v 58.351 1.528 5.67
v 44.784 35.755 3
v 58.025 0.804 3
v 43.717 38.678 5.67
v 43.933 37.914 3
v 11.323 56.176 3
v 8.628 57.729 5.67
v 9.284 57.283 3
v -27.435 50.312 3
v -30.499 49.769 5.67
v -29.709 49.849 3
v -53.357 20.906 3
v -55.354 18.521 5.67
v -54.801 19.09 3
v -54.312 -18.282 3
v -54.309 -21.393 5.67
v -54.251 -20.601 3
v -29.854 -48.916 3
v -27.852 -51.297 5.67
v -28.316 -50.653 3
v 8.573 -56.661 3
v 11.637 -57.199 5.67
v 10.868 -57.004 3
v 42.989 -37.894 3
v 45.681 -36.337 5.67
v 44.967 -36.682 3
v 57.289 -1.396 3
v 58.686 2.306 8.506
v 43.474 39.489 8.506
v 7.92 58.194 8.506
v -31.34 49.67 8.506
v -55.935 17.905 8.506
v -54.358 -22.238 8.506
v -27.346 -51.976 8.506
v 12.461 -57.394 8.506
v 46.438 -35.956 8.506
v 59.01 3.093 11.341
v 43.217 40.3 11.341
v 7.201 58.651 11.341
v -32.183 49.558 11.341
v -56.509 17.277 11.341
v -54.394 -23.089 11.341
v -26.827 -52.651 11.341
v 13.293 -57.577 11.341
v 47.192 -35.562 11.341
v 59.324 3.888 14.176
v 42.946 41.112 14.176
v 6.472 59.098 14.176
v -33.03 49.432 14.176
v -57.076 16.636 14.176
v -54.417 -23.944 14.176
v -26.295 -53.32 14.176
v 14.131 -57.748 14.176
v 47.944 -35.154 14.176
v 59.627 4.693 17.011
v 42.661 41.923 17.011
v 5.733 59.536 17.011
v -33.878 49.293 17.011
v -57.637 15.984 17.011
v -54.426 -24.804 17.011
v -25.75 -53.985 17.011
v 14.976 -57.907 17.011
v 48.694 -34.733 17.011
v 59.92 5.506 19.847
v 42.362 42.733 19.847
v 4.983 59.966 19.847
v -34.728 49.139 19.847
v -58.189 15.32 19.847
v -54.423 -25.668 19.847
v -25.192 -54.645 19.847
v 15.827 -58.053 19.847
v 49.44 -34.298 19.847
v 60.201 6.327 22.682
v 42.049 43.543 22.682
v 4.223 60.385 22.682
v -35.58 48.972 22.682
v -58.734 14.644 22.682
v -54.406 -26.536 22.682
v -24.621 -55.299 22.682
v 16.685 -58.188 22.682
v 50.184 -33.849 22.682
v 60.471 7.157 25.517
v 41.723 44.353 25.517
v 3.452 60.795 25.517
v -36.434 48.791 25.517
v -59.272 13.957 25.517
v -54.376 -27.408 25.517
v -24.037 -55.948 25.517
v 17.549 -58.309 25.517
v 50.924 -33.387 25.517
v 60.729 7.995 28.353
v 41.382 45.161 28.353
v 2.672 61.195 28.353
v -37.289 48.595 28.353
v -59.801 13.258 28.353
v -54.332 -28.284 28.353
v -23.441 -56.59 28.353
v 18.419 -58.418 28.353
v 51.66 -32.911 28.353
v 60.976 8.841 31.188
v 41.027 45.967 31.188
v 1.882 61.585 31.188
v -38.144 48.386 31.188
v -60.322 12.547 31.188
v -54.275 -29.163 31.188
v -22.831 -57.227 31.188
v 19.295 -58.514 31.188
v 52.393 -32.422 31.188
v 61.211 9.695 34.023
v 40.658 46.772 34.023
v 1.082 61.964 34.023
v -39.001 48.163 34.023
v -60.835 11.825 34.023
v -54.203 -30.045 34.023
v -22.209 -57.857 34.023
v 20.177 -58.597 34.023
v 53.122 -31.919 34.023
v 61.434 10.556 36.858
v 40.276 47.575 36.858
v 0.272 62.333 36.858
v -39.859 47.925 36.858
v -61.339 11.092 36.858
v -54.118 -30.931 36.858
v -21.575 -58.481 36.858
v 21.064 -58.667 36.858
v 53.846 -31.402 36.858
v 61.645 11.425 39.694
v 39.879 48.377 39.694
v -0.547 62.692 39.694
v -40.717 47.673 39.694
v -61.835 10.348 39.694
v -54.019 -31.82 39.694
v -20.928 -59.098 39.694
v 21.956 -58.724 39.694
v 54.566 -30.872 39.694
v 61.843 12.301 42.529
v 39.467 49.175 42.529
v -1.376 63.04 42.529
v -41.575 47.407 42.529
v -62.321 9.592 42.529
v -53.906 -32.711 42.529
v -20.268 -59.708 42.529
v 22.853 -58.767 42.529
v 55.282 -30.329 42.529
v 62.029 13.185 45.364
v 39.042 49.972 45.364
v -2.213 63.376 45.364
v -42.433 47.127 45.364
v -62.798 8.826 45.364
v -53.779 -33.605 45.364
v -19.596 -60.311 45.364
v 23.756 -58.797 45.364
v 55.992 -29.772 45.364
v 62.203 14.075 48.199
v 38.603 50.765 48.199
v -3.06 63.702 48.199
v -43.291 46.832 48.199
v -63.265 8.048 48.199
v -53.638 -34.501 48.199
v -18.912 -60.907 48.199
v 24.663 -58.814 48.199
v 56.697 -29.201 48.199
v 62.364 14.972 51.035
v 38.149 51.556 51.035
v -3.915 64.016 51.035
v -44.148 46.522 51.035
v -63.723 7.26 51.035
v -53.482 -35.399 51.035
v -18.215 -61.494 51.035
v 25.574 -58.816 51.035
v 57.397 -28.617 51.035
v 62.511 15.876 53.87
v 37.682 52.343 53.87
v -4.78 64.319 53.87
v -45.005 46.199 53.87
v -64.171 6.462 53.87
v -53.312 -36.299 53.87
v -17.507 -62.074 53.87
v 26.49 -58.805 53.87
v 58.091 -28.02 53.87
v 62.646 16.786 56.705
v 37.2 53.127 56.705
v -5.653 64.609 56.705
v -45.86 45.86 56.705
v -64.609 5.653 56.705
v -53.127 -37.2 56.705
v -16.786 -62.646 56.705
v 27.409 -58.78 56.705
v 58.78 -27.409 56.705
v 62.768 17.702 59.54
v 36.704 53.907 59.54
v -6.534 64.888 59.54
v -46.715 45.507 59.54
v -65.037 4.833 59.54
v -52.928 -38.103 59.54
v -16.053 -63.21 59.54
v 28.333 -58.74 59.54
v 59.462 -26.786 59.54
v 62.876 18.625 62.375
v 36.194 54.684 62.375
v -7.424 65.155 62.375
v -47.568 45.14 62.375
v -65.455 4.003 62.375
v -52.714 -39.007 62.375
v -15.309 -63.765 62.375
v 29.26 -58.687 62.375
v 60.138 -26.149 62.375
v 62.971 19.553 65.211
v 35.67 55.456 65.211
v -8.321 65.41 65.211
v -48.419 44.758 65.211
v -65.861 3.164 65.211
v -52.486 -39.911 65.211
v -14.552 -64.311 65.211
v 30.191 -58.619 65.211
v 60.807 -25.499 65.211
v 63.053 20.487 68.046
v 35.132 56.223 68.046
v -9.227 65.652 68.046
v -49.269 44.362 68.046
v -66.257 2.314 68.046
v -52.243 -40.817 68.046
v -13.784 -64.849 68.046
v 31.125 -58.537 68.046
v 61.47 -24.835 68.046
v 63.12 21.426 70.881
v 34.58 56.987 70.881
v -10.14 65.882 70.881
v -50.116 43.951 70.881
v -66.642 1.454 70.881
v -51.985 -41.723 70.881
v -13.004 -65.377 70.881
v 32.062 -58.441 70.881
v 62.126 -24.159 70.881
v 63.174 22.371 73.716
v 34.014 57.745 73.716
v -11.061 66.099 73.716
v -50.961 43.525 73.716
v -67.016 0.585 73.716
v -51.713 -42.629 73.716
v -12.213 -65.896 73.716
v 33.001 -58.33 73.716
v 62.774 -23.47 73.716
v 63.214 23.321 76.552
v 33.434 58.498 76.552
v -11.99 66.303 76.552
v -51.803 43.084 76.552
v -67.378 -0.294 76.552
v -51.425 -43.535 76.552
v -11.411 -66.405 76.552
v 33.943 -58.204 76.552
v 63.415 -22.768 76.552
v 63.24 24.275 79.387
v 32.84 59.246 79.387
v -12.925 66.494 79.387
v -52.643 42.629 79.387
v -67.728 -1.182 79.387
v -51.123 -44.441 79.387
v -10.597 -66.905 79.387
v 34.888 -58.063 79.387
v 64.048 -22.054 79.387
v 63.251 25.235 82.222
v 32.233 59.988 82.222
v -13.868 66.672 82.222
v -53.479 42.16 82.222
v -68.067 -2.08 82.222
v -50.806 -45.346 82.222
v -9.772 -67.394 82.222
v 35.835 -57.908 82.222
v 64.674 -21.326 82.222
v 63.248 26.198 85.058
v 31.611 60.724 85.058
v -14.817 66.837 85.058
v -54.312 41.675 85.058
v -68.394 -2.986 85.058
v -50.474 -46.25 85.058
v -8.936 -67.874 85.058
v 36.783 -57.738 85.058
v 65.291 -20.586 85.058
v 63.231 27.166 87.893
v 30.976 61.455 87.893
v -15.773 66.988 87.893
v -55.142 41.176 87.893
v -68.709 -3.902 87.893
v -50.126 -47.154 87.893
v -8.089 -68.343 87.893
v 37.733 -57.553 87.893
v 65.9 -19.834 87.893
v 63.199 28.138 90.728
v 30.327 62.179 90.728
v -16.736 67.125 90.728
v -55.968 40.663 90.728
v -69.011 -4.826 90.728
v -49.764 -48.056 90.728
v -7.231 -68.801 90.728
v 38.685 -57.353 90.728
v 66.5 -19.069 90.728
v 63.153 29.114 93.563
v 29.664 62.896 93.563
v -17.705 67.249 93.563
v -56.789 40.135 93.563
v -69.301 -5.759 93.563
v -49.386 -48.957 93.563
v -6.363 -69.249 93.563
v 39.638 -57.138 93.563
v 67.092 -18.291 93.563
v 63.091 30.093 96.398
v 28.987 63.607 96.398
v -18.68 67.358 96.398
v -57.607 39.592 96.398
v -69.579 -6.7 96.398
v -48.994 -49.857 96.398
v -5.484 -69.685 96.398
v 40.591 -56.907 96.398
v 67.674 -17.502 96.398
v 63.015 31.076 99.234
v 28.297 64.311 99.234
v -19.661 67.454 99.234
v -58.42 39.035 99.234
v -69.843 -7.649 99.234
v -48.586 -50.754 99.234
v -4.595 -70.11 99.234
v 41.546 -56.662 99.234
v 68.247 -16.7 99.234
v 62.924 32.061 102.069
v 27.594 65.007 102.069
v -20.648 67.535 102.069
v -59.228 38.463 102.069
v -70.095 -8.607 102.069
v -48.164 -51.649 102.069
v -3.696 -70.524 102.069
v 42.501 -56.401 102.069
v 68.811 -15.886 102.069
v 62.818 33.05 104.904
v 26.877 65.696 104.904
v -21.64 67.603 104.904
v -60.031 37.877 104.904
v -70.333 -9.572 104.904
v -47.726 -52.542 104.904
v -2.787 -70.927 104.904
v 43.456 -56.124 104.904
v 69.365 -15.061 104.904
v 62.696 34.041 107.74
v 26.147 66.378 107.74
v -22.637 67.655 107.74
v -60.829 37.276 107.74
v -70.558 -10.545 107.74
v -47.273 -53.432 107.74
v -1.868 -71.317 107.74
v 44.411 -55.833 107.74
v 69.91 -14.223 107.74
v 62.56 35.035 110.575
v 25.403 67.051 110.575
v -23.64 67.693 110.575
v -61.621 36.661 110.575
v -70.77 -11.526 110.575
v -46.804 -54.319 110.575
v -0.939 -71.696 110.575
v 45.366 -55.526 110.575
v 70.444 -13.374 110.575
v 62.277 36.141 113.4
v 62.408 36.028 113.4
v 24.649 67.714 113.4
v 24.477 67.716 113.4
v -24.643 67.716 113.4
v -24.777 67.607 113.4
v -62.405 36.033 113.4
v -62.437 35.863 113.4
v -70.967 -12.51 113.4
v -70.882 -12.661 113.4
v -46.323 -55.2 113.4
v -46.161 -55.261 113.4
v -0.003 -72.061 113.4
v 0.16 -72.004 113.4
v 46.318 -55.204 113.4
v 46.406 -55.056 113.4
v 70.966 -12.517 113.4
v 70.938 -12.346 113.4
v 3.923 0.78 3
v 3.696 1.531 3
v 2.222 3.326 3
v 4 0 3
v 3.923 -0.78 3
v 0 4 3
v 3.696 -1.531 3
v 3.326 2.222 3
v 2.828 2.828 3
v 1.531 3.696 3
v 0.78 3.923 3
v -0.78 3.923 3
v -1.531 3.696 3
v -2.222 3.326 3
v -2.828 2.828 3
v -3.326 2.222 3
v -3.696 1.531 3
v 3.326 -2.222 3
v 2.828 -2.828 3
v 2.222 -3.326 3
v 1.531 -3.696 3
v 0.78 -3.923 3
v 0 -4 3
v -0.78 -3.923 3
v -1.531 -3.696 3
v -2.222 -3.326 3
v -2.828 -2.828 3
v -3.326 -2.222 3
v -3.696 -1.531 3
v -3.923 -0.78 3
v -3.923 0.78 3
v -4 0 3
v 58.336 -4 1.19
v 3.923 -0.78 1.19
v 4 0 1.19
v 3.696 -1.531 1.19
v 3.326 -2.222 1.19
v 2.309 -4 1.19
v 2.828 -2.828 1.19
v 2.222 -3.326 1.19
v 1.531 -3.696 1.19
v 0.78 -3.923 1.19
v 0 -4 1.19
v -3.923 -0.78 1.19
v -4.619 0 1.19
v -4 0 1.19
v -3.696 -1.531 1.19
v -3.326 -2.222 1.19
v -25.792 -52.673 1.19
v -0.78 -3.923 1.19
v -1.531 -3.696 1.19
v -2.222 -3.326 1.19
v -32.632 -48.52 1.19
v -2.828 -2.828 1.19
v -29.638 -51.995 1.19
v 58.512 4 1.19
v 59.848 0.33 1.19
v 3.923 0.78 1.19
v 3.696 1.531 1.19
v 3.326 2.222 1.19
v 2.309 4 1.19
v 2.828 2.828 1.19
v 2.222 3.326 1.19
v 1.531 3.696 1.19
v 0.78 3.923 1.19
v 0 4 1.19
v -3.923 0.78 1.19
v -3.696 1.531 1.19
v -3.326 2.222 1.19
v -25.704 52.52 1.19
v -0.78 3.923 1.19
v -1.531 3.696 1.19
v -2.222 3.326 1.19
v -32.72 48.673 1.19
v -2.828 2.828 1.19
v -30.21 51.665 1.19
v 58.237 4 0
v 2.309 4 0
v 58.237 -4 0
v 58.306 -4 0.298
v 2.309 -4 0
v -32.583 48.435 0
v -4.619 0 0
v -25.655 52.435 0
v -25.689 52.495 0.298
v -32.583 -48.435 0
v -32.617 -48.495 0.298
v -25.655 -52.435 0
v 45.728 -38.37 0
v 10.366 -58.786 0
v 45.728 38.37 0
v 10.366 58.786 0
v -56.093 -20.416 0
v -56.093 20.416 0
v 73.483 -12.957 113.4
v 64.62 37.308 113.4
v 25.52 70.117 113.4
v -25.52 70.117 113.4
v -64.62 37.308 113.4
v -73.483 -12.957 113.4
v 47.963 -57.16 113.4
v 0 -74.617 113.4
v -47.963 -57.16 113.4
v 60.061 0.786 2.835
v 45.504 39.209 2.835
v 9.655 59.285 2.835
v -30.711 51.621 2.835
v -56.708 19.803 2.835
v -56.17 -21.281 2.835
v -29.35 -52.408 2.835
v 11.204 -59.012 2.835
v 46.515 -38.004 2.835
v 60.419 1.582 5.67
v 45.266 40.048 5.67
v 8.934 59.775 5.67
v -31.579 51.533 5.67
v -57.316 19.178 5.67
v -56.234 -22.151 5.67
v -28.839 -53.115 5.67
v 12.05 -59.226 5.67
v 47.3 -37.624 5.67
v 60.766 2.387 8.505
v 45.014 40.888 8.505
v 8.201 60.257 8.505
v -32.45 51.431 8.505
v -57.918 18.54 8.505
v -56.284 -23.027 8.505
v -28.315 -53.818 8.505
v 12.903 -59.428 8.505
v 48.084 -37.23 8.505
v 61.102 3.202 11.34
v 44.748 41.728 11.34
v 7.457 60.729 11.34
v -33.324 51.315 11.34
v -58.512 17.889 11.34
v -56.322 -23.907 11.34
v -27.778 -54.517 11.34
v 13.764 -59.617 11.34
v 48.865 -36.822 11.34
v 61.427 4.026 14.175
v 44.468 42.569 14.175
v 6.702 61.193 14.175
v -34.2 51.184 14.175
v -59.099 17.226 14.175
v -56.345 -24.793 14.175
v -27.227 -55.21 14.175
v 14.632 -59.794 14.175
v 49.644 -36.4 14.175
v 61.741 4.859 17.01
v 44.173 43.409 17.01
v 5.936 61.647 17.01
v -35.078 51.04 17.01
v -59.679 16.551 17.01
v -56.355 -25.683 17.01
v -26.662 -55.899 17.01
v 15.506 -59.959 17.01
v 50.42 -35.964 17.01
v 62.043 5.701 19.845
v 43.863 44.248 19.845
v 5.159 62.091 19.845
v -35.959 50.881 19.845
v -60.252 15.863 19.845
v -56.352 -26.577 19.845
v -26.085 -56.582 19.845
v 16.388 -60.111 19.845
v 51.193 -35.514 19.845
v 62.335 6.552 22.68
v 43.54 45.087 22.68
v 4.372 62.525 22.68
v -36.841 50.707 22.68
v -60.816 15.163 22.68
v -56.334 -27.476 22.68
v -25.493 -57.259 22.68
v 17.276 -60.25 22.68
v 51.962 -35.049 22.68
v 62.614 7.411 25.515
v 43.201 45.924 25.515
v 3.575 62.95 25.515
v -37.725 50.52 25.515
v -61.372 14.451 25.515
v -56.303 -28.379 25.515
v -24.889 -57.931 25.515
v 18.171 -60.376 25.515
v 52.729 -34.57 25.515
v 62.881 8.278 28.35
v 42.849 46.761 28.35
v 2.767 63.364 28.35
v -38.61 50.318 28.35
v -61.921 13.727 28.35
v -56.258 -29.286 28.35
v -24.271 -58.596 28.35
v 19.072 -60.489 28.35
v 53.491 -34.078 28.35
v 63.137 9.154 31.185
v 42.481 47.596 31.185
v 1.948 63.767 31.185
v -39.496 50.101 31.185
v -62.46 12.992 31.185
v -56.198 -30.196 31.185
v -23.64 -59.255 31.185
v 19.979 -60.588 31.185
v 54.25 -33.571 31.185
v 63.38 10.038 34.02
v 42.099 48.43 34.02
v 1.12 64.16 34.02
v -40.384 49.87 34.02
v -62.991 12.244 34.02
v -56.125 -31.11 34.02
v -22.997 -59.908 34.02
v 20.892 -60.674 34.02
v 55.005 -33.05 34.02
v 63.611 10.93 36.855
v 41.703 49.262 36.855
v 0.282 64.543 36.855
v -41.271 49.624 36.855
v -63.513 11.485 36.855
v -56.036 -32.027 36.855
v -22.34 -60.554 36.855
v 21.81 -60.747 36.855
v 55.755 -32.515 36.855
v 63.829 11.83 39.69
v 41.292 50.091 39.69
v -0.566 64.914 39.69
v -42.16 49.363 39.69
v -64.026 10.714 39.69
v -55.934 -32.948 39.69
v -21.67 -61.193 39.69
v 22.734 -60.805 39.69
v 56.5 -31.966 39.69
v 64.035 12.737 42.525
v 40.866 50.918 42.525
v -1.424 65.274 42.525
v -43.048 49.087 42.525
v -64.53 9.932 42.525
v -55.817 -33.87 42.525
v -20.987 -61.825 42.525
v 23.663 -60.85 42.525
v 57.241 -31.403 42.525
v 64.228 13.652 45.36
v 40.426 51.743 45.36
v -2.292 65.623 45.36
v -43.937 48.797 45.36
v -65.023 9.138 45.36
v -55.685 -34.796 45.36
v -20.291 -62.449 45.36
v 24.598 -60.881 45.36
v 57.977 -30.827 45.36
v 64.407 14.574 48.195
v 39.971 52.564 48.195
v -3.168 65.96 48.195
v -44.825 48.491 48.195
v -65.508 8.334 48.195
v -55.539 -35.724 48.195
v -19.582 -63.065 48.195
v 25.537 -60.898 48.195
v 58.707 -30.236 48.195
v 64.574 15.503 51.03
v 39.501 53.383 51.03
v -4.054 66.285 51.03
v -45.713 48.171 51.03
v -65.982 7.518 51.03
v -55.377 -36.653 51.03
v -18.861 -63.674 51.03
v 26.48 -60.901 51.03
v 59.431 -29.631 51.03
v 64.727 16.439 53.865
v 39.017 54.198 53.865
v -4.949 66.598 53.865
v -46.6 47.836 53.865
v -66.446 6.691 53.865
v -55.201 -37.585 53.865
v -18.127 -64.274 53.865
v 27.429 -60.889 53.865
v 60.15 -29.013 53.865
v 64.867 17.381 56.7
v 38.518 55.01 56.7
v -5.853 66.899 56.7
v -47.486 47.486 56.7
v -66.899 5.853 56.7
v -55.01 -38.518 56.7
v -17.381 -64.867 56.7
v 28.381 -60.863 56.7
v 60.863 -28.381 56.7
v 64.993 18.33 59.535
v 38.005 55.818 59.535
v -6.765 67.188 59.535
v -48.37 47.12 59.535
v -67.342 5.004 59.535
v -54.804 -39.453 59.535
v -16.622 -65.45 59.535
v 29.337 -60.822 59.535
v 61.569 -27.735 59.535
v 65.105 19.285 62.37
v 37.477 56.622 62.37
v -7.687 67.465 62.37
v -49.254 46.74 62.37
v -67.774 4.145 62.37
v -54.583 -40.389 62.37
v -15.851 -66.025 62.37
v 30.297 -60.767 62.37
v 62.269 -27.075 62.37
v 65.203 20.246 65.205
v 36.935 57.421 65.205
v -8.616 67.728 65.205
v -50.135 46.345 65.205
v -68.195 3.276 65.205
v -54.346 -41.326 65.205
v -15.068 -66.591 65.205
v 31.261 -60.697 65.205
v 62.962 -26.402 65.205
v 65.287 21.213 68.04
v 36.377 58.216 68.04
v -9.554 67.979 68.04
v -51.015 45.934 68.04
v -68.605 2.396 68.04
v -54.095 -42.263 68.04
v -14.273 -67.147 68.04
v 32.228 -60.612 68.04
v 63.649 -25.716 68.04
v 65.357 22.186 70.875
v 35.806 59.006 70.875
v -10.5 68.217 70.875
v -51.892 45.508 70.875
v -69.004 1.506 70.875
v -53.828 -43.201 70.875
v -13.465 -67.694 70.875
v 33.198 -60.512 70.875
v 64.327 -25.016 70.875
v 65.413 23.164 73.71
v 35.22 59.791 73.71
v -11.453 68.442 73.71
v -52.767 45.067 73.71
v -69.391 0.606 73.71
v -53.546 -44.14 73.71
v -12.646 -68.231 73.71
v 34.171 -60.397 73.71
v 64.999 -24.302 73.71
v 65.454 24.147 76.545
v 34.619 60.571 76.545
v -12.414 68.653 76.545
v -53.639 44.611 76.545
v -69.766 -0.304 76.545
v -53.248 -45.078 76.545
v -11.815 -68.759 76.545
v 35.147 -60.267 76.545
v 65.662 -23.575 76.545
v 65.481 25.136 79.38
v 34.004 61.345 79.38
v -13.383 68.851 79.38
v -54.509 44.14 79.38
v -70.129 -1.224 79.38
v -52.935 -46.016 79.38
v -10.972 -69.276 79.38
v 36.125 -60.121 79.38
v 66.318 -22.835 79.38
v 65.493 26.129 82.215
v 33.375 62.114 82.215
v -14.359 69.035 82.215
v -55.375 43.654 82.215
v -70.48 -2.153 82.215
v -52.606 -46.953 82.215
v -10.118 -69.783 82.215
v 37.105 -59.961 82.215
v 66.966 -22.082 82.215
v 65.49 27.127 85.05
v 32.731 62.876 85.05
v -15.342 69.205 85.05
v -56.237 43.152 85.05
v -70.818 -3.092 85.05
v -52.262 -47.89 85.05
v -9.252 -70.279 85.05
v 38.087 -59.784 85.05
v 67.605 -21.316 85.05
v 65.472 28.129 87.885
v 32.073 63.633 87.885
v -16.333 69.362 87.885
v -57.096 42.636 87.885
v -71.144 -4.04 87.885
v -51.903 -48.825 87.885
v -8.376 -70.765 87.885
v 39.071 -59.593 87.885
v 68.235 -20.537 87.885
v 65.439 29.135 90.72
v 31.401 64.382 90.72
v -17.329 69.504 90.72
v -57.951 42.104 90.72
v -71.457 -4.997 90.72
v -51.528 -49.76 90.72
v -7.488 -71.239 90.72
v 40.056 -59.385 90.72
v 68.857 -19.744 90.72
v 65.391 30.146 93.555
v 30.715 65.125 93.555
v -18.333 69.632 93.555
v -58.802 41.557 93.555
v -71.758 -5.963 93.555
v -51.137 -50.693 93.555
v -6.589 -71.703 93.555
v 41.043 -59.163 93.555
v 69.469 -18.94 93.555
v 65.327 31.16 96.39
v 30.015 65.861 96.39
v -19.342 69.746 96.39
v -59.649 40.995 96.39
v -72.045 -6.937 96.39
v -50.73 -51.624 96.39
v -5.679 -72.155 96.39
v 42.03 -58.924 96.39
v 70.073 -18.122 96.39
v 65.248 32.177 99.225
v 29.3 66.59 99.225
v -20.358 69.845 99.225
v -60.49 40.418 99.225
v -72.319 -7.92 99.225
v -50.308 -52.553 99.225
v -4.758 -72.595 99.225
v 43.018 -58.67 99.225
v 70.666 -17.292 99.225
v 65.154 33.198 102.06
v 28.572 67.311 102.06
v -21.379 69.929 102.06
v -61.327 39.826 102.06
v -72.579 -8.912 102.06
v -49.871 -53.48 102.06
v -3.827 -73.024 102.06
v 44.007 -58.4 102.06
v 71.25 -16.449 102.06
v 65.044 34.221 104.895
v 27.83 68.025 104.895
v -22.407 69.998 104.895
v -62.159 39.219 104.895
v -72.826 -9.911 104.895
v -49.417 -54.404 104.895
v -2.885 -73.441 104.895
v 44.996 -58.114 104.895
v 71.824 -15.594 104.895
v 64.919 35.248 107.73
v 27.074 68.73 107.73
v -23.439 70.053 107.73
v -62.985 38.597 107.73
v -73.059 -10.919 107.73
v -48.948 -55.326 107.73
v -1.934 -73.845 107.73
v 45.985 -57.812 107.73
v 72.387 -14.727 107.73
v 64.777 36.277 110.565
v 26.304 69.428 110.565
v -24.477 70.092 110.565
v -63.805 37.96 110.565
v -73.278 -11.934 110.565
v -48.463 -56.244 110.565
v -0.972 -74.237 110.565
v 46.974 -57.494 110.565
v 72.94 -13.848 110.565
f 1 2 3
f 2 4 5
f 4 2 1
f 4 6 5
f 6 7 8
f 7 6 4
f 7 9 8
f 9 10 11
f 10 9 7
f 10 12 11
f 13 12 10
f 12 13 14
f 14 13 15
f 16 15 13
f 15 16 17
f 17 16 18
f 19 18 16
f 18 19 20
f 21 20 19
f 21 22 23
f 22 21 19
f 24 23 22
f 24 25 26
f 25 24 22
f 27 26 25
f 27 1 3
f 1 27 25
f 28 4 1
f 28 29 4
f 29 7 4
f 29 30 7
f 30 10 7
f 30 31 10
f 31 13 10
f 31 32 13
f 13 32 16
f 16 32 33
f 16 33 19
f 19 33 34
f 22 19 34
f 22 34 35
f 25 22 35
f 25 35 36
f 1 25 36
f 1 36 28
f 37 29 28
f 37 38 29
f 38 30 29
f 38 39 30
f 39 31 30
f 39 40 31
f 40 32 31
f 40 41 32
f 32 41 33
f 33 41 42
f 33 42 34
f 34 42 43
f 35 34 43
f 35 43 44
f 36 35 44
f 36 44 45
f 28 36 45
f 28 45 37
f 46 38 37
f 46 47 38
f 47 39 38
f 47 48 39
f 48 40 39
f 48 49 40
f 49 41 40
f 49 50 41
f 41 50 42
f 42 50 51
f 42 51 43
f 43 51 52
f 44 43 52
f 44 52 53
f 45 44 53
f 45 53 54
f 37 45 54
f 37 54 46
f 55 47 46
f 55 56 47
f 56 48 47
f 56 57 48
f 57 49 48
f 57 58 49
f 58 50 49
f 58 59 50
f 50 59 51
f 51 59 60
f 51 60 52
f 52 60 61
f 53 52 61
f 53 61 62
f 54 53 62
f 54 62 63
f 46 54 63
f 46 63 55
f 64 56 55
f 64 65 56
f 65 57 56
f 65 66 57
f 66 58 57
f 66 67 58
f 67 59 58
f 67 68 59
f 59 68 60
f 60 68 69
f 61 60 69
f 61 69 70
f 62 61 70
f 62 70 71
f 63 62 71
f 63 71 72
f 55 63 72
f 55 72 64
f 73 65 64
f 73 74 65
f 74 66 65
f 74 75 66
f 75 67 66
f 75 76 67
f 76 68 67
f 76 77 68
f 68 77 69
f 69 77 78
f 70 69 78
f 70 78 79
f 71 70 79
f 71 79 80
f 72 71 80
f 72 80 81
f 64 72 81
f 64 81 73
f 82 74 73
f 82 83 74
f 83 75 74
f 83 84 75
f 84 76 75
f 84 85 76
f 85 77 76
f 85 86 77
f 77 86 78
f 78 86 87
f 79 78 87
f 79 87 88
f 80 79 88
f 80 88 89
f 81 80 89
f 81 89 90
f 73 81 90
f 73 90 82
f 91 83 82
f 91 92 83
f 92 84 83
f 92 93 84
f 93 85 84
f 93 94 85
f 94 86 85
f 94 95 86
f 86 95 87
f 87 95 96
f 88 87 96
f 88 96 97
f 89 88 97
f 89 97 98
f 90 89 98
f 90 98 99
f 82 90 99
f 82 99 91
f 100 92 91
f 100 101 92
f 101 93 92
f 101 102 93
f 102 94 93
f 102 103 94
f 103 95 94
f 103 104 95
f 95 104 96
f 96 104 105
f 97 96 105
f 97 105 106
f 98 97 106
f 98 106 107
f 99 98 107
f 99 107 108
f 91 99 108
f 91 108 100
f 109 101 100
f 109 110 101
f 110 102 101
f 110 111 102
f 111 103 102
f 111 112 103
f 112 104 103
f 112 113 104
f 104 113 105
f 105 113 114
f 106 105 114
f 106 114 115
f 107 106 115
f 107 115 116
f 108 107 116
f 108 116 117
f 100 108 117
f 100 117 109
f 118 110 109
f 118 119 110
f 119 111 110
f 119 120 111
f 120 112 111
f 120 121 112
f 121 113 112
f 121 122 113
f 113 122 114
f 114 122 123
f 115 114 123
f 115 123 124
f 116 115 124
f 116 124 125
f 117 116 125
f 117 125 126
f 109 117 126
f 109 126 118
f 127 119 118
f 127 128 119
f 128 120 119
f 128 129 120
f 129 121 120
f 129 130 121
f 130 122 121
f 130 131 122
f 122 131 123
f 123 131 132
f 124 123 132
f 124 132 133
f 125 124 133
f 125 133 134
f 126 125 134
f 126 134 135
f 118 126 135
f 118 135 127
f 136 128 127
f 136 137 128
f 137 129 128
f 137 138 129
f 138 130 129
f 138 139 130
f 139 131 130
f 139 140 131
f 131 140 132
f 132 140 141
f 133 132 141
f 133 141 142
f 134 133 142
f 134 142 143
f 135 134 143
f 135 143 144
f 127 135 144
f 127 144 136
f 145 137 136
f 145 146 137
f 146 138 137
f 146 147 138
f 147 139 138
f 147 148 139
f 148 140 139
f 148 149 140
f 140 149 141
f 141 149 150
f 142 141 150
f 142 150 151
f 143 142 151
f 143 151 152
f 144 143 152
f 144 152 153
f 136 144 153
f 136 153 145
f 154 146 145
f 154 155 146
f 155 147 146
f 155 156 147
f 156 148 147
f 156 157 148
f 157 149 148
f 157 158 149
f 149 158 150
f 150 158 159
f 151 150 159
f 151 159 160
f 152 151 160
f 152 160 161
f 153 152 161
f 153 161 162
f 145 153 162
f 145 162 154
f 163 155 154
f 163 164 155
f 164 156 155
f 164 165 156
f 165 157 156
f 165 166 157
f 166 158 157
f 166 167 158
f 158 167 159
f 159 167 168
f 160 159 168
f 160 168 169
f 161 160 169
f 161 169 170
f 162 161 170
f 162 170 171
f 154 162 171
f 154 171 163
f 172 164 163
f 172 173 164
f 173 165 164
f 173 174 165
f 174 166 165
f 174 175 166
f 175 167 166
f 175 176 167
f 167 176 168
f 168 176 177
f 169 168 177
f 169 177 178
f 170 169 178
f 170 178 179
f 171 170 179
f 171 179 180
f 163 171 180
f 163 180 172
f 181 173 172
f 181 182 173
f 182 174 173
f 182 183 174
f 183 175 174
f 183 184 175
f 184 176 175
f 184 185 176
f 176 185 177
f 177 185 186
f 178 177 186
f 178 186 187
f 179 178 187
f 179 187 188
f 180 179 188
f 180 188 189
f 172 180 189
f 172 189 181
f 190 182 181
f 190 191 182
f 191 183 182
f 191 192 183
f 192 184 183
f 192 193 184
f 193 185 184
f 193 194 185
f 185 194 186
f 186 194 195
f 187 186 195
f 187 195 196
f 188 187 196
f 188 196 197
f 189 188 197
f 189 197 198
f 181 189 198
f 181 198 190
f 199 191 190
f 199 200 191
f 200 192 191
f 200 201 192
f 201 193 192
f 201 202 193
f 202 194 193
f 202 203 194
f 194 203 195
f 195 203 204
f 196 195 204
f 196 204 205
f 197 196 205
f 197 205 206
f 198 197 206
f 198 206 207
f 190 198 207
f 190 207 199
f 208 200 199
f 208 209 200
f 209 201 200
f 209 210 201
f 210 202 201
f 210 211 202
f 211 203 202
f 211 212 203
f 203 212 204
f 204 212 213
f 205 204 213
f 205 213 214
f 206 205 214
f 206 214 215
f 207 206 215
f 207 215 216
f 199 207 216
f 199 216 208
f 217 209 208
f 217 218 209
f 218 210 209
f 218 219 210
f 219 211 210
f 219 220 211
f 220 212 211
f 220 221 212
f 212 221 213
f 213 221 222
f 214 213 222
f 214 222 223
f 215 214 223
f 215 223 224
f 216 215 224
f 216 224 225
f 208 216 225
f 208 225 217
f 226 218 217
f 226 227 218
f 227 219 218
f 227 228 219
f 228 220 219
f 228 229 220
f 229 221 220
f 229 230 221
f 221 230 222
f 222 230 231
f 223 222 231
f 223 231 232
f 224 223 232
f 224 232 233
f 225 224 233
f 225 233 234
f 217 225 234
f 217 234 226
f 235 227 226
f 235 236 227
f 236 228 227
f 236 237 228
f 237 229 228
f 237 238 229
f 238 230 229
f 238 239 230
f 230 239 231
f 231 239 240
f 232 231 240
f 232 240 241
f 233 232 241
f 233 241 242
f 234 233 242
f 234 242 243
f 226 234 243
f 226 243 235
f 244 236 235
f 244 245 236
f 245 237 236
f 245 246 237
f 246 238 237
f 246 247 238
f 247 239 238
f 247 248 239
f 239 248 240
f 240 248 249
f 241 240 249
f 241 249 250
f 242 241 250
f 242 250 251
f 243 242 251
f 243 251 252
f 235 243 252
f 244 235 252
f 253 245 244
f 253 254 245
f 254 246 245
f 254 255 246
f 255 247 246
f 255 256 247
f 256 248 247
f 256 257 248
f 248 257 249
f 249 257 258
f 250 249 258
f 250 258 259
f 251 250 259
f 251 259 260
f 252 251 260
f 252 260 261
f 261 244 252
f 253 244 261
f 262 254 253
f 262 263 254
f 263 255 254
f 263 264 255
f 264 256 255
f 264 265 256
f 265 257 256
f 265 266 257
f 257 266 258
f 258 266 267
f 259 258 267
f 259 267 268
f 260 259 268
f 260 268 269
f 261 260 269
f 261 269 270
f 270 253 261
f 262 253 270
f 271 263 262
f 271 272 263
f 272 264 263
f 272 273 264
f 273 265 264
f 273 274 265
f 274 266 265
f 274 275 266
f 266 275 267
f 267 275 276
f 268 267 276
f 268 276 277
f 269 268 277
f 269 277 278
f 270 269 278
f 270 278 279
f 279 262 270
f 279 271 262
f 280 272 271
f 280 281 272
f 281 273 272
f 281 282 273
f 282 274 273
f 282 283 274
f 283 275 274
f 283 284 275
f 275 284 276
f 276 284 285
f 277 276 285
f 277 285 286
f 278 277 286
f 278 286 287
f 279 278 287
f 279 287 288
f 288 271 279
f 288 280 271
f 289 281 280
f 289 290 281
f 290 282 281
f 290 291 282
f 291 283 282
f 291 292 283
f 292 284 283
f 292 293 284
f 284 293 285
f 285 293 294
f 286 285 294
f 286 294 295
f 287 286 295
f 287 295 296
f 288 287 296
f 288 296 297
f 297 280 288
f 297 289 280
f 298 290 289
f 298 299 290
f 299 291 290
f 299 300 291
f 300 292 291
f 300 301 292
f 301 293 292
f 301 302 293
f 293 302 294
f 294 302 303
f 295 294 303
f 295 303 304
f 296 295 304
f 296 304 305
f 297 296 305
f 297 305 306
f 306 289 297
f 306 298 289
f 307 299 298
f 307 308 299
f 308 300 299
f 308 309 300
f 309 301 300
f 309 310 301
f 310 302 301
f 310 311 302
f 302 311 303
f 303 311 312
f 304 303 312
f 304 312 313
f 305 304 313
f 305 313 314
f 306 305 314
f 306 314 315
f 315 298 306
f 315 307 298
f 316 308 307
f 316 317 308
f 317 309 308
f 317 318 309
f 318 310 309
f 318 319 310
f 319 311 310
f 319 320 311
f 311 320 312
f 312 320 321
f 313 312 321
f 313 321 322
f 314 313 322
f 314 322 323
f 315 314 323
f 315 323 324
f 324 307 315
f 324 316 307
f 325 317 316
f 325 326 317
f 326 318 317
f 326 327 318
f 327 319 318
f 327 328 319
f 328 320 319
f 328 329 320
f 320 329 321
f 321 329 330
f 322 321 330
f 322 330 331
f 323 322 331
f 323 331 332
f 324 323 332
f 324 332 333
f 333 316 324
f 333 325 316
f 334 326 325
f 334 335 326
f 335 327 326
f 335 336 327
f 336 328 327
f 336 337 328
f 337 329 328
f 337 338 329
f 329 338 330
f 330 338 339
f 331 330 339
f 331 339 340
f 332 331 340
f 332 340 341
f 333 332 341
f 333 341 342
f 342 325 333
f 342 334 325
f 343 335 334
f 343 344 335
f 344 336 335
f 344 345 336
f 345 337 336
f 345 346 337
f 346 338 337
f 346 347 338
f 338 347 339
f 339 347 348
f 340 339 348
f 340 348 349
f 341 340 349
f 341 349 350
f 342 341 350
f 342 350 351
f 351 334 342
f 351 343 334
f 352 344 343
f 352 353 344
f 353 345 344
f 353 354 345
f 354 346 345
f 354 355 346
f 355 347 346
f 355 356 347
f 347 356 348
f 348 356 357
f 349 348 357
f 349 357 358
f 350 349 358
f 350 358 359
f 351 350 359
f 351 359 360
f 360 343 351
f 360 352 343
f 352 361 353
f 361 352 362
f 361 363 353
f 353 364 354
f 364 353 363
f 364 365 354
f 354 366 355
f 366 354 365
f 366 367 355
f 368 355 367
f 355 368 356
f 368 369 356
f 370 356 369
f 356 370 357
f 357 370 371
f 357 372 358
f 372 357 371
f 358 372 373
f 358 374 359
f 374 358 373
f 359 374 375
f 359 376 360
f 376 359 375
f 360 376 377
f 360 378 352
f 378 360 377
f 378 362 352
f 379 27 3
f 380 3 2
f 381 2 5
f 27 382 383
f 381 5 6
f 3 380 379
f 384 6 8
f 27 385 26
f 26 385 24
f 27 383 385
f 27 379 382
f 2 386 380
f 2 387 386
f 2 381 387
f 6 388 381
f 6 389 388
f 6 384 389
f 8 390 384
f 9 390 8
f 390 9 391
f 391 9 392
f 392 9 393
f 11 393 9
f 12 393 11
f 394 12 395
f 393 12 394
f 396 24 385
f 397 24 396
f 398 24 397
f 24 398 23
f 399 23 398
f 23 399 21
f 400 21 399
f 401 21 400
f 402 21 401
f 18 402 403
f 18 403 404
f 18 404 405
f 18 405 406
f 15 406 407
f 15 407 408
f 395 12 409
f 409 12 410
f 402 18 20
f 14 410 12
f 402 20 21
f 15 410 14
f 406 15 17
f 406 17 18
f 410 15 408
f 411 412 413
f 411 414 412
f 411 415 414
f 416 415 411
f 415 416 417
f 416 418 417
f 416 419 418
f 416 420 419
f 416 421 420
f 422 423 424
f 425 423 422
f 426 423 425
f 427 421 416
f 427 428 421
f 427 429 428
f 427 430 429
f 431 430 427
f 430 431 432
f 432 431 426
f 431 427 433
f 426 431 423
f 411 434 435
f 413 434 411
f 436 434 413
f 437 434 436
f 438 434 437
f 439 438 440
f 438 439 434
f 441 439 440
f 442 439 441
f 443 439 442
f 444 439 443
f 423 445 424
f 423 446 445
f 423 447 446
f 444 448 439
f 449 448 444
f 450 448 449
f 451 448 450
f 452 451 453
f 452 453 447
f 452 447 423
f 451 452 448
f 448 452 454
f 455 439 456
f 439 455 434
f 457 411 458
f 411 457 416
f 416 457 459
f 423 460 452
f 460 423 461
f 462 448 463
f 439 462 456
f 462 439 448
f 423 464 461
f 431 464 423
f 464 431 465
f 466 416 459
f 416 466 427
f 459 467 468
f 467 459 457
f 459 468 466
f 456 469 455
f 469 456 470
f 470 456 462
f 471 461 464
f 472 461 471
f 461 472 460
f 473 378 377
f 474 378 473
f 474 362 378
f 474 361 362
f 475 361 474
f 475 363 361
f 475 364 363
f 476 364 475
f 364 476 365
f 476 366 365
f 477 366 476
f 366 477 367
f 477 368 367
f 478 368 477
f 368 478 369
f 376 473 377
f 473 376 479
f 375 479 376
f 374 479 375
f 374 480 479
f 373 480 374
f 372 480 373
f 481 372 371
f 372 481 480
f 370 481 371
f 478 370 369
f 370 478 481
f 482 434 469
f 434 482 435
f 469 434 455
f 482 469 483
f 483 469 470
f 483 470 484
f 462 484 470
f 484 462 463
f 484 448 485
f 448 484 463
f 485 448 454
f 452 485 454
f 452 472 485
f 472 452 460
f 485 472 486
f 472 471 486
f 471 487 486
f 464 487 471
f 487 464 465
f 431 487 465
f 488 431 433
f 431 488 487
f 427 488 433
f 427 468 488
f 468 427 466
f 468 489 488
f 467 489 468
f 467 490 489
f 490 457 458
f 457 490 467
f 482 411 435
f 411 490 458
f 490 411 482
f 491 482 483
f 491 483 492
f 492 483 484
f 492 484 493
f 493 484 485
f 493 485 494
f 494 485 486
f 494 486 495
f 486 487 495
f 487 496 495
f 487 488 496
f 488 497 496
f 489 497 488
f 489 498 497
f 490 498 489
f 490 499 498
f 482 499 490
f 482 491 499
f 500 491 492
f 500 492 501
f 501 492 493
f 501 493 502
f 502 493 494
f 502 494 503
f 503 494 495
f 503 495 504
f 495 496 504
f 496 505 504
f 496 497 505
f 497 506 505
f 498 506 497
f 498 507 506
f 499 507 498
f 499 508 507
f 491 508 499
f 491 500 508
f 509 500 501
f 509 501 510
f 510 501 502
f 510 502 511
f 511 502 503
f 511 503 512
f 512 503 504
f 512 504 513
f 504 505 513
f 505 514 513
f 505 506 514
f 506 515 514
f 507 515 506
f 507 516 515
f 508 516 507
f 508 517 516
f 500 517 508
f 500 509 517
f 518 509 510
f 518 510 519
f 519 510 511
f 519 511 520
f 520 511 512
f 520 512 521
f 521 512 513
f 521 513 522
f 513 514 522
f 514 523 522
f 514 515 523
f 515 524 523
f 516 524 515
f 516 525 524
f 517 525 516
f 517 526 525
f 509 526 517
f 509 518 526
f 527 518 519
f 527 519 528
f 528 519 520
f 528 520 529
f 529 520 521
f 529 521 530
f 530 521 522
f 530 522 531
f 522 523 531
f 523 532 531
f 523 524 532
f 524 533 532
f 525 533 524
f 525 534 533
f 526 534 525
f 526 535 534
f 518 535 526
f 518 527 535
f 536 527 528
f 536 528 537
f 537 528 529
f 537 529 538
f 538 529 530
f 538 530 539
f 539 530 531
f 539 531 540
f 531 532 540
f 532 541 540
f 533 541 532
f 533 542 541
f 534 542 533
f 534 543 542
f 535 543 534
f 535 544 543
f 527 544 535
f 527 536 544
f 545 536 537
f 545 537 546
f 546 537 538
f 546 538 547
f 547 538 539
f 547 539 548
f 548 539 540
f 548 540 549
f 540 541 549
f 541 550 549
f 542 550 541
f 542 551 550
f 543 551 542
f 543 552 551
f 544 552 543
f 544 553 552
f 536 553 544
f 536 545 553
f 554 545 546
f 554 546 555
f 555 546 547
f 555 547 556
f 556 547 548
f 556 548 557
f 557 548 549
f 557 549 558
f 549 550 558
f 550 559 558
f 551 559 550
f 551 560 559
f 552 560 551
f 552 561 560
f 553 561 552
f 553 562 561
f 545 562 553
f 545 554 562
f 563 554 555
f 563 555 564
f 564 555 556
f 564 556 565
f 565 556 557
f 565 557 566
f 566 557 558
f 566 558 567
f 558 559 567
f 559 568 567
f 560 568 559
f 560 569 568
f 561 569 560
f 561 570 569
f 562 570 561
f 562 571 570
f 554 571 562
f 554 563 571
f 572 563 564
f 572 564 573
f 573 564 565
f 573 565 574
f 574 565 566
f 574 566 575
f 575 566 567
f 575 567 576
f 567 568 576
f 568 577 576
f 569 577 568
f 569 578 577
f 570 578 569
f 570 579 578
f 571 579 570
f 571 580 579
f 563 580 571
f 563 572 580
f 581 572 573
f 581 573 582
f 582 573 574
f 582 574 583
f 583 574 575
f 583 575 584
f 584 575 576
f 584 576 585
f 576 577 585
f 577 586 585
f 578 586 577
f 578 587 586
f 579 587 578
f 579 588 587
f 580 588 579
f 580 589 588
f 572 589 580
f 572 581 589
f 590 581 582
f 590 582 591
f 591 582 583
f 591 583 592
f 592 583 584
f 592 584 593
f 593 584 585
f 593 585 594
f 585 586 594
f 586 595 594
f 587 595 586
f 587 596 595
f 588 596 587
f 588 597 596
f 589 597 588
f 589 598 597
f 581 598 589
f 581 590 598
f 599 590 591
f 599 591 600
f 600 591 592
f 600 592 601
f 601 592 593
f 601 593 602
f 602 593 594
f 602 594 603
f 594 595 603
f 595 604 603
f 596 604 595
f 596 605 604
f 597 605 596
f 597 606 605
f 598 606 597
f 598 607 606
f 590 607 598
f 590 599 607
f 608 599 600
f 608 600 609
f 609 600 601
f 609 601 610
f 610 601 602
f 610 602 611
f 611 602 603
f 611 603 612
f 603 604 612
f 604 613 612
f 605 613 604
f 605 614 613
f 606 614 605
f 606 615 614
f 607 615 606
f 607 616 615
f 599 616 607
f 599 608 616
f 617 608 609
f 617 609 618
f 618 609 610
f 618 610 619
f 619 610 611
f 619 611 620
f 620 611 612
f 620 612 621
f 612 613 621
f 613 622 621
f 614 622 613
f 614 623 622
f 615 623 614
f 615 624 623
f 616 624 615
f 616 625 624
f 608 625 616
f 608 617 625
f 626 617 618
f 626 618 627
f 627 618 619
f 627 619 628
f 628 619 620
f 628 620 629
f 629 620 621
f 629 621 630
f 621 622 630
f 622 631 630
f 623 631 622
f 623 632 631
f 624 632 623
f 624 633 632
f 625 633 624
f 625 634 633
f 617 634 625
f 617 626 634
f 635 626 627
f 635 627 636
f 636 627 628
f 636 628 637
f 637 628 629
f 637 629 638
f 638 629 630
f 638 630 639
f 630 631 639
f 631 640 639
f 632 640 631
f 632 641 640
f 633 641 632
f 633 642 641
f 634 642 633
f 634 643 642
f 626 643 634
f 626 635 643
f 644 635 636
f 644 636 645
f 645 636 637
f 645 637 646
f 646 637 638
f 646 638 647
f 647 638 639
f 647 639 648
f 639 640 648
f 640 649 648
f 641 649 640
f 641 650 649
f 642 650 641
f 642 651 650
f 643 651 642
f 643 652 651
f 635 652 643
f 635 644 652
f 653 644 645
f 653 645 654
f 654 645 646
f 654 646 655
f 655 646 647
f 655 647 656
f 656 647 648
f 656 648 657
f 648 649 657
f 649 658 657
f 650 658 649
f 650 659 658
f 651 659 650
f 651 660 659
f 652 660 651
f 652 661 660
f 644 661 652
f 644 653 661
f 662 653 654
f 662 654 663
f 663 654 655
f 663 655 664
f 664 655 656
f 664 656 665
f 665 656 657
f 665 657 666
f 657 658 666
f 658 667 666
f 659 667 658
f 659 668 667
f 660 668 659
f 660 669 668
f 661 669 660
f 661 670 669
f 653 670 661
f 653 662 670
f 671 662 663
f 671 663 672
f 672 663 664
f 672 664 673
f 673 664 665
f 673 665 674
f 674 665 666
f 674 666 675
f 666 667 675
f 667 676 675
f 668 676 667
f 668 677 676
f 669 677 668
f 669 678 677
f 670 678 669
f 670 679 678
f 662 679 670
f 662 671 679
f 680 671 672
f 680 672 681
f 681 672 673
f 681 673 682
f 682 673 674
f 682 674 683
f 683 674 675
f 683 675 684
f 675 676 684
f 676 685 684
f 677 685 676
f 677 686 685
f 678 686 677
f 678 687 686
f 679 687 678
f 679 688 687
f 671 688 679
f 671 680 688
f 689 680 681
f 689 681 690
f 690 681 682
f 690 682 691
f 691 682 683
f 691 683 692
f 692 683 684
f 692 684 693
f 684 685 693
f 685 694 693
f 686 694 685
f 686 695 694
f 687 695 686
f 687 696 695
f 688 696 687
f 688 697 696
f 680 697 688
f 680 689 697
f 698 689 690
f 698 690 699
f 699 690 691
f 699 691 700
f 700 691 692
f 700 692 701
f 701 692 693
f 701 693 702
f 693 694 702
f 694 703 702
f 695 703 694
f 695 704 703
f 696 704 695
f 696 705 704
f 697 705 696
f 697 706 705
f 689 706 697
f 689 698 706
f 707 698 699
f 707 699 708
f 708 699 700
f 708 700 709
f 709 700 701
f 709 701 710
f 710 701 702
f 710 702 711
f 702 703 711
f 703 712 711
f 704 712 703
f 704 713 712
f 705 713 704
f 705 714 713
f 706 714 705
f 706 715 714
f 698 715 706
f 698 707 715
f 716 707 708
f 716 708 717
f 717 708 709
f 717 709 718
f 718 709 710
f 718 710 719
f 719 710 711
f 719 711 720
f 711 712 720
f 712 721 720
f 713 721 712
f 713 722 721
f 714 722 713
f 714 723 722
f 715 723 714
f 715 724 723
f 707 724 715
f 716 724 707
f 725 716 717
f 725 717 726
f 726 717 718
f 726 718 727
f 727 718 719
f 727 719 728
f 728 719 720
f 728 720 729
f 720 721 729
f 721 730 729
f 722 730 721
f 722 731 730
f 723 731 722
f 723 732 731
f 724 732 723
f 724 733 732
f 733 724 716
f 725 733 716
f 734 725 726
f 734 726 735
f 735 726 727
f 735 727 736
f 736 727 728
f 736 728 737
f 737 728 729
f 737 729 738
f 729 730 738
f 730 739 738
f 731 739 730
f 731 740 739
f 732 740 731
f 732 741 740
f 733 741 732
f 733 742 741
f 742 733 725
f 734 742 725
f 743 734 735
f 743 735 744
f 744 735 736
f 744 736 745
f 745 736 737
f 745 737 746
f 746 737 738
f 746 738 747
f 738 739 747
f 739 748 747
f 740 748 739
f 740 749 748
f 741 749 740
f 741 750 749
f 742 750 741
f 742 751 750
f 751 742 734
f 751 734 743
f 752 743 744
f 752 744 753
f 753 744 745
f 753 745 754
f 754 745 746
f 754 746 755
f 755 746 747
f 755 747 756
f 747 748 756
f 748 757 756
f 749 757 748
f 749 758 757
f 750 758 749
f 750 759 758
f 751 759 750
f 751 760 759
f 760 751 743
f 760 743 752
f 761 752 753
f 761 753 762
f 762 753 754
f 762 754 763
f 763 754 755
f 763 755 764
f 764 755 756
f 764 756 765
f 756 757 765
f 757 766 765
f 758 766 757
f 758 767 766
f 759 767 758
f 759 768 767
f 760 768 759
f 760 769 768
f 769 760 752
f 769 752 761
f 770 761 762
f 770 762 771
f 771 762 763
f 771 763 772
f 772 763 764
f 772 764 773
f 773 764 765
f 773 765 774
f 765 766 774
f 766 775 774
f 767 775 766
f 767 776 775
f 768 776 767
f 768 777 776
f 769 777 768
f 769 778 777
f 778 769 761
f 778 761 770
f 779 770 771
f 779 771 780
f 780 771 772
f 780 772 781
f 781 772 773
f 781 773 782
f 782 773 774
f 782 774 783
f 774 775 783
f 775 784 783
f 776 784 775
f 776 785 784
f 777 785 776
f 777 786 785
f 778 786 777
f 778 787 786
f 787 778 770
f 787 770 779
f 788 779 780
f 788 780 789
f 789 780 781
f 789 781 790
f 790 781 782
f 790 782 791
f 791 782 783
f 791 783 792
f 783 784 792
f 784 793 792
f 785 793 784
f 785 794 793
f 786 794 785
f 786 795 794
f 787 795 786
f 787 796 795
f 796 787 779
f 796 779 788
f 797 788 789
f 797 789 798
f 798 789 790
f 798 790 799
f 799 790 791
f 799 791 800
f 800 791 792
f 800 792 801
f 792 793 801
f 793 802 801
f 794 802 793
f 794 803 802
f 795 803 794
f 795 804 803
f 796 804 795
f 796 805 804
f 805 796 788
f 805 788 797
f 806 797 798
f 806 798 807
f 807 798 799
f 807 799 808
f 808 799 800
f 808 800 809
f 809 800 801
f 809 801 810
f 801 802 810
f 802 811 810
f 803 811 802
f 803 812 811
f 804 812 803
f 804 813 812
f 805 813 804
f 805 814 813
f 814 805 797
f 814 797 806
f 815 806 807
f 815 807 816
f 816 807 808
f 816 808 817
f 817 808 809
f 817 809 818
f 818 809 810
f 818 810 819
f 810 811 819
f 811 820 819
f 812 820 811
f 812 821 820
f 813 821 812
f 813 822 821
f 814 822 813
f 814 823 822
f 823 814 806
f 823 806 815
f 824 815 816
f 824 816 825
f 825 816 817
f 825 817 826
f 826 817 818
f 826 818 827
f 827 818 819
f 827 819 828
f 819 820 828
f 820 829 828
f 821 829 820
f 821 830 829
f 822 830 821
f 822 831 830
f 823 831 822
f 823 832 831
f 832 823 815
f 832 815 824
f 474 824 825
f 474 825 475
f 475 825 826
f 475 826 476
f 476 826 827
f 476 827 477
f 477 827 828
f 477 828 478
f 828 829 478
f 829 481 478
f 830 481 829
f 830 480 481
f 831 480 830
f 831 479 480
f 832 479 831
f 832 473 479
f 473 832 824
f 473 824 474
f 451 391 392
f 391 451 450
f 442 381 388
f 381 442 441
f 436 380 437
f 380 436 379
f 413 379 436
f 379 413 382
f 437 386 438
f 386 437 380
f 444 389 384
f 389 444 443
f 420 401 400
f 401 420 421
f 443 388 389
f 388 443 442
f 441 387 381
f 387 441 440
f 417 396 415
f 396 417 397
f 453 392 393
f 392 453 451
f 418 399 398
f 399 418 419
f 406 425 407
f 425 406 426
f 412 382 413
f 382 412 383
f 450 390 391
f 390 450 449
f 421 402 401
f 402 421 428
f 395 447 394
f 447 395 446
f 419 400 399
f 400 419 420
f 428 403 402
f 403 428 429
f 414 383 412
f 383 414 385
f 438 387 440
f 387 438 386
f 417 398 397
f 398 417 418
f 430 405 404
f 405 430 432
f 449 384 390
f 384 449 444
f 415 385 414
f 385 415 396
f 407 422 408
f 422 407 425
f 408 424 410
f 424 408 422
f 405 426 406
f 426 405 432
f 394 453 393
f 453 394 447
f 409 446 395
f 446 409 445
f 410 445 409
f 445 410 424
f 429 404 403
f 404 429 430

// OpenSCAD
// Faceted Planter (cachepot) with drainage and matching saucer - original parametric design (Brian Sacco)
// Sized around STANDARD NURSERY POTS: set `pot` to the nursery pot's rim diameter (mm) and the
// planter is computed so the pot drops in with 14 mm of total clearance at the narrowest point
// (inscribed circle of the facets) and enough depth for the pot's height.
//   Common nursery pots (rim Ø x height): 9 cm x ~8 cm, 12 cm x ~10.5 cm, 15 cm x ~13 cm.
pot      = 120;    // nursery pot rim diameter (mm); 0 = use top_d / height below
pot_h    = 0;      // nursery pot height (0 = 0.87 x pot, typical for round nursery pots)
top_d    = 110;    // (only if pot = 0) outer diameter at the rim, corner to corner
height   = 100;    // (only if pot = 0)
taper    = 0.80;   // bottom diameter as a fraction of the top (nursery pots taper ~0.75)
sides    = 9;      // facets (6-12 look great; 60 = round)
twist    = 30;     // degrees of twist from bottom to top
wall     = 2.4;
floor_t  = 3;
clearance = 14;    // total diametral clearance around the nursery pot rim
drain_d  = 8;      // drainage hole (0 = none)
part     = "pot";  // "pot" or "saucer"

k   = cos(180 / sides);                                     // inscribed / circumscribed ratio
PH  = pot > 0 ? (pot_h > 0 ? pot_h : 0.87 * pot) : 0;
HT  = pot > 0 ? PH + floor_t + 6 : height;                  // 6 mm: pot rim sits just below the top
Z_RIM = HT - 6;                                             // height where the nursery pot's rim sits
S_RIM = taper + (1 - taper) * Z_RIM / HT;                   // loft scale there (1 = top)
// the clearance is guaranteed WHERE THE POT RIM SITS (the planter narrows towards the bottom)
TD  = pot > 0 ? ((pot + clearance) / S_RIM + 2 * wall) / k : top_d;   // outer rim, corner to corner
echo(str("PLANTER outer_rim_corner=", TD, " height=", HT, " pot_rim_z=", Z_RIM));

module shell(d_top, h) {
    linear_extrude(height=h, twist=-twist, scale=1/taper, slices=40)
        circle(d=d_top*taper, $fn=sides);
}
if (part == "pot") {
    difference() {
        shell(TD, HT);
        // inner shell: same loft (twist + scale aligned with the outside), sized so that at the RIM
        // the wall is exactly `wall` thick across the flats; only the part above the floor is removed
        intersection() {
            linear_extrude(height=HT + 0.01, twist=-twist, scale=1/taper, slices=40)
                circle(d=(TD * k - 2 * wall) / k * taper, $fn=sides);
            translate([0, 0, floor_t]) cylinder(d=TD * 2, h=HT);
        }
        if (drain_d > 0) translate([0,0,-1]) cylinder(d=drain_d, h=floor_t+2, $fn=32);
        // three drainage channels under the pot
        for (a=[0:120:240]) rotate(a) translate([0,-4,-0.01]) cube([TD, 8, 1.2]);
    }
} else {
    sd = TD*taper + 16;   // saucer: 8 mm wider than the planter base on every side
    difference() {
        cylinder(d1=sd-4, d2=sd, h=14, $fn=sides);
        translate([0,0,2.4]) cylinder(d1=sd-4-2*wall/k, d2=sd-2*wall/k, h=14, $fn=sides);
    }
}
